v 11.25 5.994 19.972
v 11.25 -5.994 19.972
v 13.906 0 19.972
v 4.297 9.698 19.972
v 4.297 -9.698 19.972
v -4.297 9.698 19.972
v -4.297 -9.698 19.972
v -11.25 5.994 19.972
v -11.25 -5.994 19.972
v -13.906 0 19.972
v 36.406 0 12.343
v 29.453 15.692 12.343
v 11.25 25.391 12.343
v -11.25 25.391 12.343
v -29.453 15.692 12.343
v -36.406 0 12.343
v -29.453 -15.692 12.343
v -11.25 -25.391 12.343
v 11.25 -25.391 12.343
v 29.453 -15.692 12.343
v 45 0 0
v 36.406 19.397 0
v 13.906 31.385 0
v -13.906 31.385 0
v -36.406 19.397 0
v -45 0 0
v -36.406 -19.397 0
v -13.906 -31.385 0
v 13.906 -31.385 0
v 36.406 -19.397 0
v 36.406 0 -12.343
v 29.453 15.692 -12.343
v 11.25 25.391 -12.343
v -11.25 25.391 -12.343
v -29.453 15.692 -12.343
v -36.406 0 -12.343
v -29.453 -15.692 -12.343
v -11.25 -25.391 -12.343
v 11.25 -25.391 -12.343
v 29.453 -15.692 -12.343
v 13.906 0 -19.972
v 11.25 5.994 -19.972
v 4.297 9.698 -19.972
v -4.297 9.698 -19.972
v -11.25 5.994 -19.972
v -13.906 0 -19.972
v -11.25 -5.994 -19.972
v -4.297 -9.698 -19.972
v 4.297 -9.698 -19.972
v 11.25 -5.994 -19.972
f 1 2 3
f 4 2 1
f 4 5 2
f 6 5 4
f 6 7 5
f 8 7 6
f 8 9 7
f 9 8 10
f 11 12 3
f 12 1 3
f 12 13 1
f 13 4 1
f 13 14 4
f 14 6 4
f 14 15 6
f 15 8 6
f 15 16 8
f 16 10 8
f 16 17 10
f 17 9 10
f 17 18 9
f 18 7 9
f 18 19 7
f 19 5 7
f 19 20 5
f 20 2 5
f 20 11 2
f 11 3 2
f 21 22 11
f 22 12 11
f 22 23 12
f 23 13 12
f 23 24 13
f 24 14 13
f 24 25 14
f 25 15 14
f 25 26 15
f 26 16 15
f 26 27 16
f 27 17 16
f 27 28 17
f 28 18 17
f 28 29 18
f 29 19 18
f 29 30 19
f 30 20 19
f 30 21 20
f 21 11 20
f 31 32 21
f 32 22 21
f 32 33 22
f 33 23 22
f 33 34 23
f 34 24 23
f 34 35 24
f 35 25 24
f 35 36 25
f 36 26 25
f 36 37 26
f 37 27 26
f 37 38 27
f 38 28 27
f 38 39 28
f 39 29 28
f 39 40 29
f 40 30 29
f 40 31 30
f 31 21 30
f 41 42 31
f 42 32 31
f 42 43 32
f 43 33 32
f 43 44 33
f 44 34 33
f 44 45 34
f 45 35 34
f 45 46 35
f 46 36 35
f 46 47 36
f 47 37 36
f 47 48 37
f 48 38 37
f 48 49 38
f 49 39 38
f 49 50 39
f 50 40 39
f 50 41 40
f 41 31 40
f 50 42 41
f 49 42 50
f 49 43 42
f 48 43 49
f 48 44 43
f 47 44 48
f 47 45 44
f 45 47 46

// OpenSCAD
// Generated by SolidPython 1.0.1 on 2020-07-29 00:46:52


scale(v = [15, 11, 7]) {
	sphere(r = 3);
}
/***********************************************
*********      SolidPython code:      **********
************************************************
 
# import packages: SolidPython
from solid import *
from solid.utils import *
from itertools import chain, combinations, permutations


class Resize:

    def __init__(self, scad_file):
        self.scad_file = scad_file
        #self.scad_file = import_scad(scad_file)
        # cone/cylinder param:
        self.r1 = 0
        self.r2 = 0
        self.h = 0
        # rectangular prism param:
        self.w = 0
        self.l = 0
        # ellipse param:
        self.r = 0

    # import OpenScad code (file name corresponds to shape)


    # classify shape + parameters
    def assign(self, param1, param2, param3):
        if self.scad_file == 'cone.scad':
            self.r1 = param1
            self.r2 = param2
            self.h = param3
        elif self.scad_file == 'cylinder.scad':
            self.r1 = param1
            self.r2 = param2
            self.h = param3
        elif self.scad_file == 'rectangularPrism.scad':
            self.h = param1
            self.l = param2
            self.w = param3
        else:
            self.r = param1
            self.h = param2

    # resize parameters
    def iterate(self):
        x = range(3, 20, 2)
        i = 1
        if self.scad_file == 'cone.scad':
            tempList = list(permutations(x, 2))
            for temp in tempList:
                param1 = temp[0]
                param2 = temp[1]
                filepath = 'produced_scad_files/' + 'cone' + str(param1) + '_' + str(param2) + '_' + '.scad'
                scad_render_to_file(cylinder(h=param1, r1=param2, r2=0), filepath)

        elif self.scad_file == 'cylinder.scad':
            tempList = list(permutations(x, 3))
            for temp in tempList:
                param1 = temp[0]
                param2 = temp[1]
                filepath = 'produced_scad_files/' + 'cylinder' + str(param1) + '_' + str(param2) + '_' + '.scad'
                scad_render_to_file(cylinder(h=param1, r1=param2, r2=param2), filepath)

        elif self.scad_file == 'rectangularPrism.scad':
            tempList = list(permutations(x, 3))
            for temp in tempList:
                param1 = temp[0]
                param2 = temp[1]
                param3 = temp[2]
                filepath = 'produced_scad_files/' + 'rectangularPrism' + str(param1) + '_' + str(param2) + '_' + str(
                    param3) + '.scad'
                scad_render_to_file(cube(size=(param1, param2, param3)), filepath)

        elif self.scad_file == 'ellipse.scad':
            tempList = list(permutations(x, 4))
            for temp in tempList:
                param1 = temp[0]
                param2 = temp[1]
                param3 = temp[2]
                param4 = temp[3]
                filepath = 'produced_scad_files/' + 'ellipse' + str(param1) + '_' + str(param2) + '_' + str(param3) + '_' + str(param4) + '.scad'
                scad_render_to_file(scale([param1, param2, param3])(sphere(r=param4)), filepath)

    def render_to_scadfile(self):
        scad_render_to_file(scad, 'example.scad') 
 
************************************************/
